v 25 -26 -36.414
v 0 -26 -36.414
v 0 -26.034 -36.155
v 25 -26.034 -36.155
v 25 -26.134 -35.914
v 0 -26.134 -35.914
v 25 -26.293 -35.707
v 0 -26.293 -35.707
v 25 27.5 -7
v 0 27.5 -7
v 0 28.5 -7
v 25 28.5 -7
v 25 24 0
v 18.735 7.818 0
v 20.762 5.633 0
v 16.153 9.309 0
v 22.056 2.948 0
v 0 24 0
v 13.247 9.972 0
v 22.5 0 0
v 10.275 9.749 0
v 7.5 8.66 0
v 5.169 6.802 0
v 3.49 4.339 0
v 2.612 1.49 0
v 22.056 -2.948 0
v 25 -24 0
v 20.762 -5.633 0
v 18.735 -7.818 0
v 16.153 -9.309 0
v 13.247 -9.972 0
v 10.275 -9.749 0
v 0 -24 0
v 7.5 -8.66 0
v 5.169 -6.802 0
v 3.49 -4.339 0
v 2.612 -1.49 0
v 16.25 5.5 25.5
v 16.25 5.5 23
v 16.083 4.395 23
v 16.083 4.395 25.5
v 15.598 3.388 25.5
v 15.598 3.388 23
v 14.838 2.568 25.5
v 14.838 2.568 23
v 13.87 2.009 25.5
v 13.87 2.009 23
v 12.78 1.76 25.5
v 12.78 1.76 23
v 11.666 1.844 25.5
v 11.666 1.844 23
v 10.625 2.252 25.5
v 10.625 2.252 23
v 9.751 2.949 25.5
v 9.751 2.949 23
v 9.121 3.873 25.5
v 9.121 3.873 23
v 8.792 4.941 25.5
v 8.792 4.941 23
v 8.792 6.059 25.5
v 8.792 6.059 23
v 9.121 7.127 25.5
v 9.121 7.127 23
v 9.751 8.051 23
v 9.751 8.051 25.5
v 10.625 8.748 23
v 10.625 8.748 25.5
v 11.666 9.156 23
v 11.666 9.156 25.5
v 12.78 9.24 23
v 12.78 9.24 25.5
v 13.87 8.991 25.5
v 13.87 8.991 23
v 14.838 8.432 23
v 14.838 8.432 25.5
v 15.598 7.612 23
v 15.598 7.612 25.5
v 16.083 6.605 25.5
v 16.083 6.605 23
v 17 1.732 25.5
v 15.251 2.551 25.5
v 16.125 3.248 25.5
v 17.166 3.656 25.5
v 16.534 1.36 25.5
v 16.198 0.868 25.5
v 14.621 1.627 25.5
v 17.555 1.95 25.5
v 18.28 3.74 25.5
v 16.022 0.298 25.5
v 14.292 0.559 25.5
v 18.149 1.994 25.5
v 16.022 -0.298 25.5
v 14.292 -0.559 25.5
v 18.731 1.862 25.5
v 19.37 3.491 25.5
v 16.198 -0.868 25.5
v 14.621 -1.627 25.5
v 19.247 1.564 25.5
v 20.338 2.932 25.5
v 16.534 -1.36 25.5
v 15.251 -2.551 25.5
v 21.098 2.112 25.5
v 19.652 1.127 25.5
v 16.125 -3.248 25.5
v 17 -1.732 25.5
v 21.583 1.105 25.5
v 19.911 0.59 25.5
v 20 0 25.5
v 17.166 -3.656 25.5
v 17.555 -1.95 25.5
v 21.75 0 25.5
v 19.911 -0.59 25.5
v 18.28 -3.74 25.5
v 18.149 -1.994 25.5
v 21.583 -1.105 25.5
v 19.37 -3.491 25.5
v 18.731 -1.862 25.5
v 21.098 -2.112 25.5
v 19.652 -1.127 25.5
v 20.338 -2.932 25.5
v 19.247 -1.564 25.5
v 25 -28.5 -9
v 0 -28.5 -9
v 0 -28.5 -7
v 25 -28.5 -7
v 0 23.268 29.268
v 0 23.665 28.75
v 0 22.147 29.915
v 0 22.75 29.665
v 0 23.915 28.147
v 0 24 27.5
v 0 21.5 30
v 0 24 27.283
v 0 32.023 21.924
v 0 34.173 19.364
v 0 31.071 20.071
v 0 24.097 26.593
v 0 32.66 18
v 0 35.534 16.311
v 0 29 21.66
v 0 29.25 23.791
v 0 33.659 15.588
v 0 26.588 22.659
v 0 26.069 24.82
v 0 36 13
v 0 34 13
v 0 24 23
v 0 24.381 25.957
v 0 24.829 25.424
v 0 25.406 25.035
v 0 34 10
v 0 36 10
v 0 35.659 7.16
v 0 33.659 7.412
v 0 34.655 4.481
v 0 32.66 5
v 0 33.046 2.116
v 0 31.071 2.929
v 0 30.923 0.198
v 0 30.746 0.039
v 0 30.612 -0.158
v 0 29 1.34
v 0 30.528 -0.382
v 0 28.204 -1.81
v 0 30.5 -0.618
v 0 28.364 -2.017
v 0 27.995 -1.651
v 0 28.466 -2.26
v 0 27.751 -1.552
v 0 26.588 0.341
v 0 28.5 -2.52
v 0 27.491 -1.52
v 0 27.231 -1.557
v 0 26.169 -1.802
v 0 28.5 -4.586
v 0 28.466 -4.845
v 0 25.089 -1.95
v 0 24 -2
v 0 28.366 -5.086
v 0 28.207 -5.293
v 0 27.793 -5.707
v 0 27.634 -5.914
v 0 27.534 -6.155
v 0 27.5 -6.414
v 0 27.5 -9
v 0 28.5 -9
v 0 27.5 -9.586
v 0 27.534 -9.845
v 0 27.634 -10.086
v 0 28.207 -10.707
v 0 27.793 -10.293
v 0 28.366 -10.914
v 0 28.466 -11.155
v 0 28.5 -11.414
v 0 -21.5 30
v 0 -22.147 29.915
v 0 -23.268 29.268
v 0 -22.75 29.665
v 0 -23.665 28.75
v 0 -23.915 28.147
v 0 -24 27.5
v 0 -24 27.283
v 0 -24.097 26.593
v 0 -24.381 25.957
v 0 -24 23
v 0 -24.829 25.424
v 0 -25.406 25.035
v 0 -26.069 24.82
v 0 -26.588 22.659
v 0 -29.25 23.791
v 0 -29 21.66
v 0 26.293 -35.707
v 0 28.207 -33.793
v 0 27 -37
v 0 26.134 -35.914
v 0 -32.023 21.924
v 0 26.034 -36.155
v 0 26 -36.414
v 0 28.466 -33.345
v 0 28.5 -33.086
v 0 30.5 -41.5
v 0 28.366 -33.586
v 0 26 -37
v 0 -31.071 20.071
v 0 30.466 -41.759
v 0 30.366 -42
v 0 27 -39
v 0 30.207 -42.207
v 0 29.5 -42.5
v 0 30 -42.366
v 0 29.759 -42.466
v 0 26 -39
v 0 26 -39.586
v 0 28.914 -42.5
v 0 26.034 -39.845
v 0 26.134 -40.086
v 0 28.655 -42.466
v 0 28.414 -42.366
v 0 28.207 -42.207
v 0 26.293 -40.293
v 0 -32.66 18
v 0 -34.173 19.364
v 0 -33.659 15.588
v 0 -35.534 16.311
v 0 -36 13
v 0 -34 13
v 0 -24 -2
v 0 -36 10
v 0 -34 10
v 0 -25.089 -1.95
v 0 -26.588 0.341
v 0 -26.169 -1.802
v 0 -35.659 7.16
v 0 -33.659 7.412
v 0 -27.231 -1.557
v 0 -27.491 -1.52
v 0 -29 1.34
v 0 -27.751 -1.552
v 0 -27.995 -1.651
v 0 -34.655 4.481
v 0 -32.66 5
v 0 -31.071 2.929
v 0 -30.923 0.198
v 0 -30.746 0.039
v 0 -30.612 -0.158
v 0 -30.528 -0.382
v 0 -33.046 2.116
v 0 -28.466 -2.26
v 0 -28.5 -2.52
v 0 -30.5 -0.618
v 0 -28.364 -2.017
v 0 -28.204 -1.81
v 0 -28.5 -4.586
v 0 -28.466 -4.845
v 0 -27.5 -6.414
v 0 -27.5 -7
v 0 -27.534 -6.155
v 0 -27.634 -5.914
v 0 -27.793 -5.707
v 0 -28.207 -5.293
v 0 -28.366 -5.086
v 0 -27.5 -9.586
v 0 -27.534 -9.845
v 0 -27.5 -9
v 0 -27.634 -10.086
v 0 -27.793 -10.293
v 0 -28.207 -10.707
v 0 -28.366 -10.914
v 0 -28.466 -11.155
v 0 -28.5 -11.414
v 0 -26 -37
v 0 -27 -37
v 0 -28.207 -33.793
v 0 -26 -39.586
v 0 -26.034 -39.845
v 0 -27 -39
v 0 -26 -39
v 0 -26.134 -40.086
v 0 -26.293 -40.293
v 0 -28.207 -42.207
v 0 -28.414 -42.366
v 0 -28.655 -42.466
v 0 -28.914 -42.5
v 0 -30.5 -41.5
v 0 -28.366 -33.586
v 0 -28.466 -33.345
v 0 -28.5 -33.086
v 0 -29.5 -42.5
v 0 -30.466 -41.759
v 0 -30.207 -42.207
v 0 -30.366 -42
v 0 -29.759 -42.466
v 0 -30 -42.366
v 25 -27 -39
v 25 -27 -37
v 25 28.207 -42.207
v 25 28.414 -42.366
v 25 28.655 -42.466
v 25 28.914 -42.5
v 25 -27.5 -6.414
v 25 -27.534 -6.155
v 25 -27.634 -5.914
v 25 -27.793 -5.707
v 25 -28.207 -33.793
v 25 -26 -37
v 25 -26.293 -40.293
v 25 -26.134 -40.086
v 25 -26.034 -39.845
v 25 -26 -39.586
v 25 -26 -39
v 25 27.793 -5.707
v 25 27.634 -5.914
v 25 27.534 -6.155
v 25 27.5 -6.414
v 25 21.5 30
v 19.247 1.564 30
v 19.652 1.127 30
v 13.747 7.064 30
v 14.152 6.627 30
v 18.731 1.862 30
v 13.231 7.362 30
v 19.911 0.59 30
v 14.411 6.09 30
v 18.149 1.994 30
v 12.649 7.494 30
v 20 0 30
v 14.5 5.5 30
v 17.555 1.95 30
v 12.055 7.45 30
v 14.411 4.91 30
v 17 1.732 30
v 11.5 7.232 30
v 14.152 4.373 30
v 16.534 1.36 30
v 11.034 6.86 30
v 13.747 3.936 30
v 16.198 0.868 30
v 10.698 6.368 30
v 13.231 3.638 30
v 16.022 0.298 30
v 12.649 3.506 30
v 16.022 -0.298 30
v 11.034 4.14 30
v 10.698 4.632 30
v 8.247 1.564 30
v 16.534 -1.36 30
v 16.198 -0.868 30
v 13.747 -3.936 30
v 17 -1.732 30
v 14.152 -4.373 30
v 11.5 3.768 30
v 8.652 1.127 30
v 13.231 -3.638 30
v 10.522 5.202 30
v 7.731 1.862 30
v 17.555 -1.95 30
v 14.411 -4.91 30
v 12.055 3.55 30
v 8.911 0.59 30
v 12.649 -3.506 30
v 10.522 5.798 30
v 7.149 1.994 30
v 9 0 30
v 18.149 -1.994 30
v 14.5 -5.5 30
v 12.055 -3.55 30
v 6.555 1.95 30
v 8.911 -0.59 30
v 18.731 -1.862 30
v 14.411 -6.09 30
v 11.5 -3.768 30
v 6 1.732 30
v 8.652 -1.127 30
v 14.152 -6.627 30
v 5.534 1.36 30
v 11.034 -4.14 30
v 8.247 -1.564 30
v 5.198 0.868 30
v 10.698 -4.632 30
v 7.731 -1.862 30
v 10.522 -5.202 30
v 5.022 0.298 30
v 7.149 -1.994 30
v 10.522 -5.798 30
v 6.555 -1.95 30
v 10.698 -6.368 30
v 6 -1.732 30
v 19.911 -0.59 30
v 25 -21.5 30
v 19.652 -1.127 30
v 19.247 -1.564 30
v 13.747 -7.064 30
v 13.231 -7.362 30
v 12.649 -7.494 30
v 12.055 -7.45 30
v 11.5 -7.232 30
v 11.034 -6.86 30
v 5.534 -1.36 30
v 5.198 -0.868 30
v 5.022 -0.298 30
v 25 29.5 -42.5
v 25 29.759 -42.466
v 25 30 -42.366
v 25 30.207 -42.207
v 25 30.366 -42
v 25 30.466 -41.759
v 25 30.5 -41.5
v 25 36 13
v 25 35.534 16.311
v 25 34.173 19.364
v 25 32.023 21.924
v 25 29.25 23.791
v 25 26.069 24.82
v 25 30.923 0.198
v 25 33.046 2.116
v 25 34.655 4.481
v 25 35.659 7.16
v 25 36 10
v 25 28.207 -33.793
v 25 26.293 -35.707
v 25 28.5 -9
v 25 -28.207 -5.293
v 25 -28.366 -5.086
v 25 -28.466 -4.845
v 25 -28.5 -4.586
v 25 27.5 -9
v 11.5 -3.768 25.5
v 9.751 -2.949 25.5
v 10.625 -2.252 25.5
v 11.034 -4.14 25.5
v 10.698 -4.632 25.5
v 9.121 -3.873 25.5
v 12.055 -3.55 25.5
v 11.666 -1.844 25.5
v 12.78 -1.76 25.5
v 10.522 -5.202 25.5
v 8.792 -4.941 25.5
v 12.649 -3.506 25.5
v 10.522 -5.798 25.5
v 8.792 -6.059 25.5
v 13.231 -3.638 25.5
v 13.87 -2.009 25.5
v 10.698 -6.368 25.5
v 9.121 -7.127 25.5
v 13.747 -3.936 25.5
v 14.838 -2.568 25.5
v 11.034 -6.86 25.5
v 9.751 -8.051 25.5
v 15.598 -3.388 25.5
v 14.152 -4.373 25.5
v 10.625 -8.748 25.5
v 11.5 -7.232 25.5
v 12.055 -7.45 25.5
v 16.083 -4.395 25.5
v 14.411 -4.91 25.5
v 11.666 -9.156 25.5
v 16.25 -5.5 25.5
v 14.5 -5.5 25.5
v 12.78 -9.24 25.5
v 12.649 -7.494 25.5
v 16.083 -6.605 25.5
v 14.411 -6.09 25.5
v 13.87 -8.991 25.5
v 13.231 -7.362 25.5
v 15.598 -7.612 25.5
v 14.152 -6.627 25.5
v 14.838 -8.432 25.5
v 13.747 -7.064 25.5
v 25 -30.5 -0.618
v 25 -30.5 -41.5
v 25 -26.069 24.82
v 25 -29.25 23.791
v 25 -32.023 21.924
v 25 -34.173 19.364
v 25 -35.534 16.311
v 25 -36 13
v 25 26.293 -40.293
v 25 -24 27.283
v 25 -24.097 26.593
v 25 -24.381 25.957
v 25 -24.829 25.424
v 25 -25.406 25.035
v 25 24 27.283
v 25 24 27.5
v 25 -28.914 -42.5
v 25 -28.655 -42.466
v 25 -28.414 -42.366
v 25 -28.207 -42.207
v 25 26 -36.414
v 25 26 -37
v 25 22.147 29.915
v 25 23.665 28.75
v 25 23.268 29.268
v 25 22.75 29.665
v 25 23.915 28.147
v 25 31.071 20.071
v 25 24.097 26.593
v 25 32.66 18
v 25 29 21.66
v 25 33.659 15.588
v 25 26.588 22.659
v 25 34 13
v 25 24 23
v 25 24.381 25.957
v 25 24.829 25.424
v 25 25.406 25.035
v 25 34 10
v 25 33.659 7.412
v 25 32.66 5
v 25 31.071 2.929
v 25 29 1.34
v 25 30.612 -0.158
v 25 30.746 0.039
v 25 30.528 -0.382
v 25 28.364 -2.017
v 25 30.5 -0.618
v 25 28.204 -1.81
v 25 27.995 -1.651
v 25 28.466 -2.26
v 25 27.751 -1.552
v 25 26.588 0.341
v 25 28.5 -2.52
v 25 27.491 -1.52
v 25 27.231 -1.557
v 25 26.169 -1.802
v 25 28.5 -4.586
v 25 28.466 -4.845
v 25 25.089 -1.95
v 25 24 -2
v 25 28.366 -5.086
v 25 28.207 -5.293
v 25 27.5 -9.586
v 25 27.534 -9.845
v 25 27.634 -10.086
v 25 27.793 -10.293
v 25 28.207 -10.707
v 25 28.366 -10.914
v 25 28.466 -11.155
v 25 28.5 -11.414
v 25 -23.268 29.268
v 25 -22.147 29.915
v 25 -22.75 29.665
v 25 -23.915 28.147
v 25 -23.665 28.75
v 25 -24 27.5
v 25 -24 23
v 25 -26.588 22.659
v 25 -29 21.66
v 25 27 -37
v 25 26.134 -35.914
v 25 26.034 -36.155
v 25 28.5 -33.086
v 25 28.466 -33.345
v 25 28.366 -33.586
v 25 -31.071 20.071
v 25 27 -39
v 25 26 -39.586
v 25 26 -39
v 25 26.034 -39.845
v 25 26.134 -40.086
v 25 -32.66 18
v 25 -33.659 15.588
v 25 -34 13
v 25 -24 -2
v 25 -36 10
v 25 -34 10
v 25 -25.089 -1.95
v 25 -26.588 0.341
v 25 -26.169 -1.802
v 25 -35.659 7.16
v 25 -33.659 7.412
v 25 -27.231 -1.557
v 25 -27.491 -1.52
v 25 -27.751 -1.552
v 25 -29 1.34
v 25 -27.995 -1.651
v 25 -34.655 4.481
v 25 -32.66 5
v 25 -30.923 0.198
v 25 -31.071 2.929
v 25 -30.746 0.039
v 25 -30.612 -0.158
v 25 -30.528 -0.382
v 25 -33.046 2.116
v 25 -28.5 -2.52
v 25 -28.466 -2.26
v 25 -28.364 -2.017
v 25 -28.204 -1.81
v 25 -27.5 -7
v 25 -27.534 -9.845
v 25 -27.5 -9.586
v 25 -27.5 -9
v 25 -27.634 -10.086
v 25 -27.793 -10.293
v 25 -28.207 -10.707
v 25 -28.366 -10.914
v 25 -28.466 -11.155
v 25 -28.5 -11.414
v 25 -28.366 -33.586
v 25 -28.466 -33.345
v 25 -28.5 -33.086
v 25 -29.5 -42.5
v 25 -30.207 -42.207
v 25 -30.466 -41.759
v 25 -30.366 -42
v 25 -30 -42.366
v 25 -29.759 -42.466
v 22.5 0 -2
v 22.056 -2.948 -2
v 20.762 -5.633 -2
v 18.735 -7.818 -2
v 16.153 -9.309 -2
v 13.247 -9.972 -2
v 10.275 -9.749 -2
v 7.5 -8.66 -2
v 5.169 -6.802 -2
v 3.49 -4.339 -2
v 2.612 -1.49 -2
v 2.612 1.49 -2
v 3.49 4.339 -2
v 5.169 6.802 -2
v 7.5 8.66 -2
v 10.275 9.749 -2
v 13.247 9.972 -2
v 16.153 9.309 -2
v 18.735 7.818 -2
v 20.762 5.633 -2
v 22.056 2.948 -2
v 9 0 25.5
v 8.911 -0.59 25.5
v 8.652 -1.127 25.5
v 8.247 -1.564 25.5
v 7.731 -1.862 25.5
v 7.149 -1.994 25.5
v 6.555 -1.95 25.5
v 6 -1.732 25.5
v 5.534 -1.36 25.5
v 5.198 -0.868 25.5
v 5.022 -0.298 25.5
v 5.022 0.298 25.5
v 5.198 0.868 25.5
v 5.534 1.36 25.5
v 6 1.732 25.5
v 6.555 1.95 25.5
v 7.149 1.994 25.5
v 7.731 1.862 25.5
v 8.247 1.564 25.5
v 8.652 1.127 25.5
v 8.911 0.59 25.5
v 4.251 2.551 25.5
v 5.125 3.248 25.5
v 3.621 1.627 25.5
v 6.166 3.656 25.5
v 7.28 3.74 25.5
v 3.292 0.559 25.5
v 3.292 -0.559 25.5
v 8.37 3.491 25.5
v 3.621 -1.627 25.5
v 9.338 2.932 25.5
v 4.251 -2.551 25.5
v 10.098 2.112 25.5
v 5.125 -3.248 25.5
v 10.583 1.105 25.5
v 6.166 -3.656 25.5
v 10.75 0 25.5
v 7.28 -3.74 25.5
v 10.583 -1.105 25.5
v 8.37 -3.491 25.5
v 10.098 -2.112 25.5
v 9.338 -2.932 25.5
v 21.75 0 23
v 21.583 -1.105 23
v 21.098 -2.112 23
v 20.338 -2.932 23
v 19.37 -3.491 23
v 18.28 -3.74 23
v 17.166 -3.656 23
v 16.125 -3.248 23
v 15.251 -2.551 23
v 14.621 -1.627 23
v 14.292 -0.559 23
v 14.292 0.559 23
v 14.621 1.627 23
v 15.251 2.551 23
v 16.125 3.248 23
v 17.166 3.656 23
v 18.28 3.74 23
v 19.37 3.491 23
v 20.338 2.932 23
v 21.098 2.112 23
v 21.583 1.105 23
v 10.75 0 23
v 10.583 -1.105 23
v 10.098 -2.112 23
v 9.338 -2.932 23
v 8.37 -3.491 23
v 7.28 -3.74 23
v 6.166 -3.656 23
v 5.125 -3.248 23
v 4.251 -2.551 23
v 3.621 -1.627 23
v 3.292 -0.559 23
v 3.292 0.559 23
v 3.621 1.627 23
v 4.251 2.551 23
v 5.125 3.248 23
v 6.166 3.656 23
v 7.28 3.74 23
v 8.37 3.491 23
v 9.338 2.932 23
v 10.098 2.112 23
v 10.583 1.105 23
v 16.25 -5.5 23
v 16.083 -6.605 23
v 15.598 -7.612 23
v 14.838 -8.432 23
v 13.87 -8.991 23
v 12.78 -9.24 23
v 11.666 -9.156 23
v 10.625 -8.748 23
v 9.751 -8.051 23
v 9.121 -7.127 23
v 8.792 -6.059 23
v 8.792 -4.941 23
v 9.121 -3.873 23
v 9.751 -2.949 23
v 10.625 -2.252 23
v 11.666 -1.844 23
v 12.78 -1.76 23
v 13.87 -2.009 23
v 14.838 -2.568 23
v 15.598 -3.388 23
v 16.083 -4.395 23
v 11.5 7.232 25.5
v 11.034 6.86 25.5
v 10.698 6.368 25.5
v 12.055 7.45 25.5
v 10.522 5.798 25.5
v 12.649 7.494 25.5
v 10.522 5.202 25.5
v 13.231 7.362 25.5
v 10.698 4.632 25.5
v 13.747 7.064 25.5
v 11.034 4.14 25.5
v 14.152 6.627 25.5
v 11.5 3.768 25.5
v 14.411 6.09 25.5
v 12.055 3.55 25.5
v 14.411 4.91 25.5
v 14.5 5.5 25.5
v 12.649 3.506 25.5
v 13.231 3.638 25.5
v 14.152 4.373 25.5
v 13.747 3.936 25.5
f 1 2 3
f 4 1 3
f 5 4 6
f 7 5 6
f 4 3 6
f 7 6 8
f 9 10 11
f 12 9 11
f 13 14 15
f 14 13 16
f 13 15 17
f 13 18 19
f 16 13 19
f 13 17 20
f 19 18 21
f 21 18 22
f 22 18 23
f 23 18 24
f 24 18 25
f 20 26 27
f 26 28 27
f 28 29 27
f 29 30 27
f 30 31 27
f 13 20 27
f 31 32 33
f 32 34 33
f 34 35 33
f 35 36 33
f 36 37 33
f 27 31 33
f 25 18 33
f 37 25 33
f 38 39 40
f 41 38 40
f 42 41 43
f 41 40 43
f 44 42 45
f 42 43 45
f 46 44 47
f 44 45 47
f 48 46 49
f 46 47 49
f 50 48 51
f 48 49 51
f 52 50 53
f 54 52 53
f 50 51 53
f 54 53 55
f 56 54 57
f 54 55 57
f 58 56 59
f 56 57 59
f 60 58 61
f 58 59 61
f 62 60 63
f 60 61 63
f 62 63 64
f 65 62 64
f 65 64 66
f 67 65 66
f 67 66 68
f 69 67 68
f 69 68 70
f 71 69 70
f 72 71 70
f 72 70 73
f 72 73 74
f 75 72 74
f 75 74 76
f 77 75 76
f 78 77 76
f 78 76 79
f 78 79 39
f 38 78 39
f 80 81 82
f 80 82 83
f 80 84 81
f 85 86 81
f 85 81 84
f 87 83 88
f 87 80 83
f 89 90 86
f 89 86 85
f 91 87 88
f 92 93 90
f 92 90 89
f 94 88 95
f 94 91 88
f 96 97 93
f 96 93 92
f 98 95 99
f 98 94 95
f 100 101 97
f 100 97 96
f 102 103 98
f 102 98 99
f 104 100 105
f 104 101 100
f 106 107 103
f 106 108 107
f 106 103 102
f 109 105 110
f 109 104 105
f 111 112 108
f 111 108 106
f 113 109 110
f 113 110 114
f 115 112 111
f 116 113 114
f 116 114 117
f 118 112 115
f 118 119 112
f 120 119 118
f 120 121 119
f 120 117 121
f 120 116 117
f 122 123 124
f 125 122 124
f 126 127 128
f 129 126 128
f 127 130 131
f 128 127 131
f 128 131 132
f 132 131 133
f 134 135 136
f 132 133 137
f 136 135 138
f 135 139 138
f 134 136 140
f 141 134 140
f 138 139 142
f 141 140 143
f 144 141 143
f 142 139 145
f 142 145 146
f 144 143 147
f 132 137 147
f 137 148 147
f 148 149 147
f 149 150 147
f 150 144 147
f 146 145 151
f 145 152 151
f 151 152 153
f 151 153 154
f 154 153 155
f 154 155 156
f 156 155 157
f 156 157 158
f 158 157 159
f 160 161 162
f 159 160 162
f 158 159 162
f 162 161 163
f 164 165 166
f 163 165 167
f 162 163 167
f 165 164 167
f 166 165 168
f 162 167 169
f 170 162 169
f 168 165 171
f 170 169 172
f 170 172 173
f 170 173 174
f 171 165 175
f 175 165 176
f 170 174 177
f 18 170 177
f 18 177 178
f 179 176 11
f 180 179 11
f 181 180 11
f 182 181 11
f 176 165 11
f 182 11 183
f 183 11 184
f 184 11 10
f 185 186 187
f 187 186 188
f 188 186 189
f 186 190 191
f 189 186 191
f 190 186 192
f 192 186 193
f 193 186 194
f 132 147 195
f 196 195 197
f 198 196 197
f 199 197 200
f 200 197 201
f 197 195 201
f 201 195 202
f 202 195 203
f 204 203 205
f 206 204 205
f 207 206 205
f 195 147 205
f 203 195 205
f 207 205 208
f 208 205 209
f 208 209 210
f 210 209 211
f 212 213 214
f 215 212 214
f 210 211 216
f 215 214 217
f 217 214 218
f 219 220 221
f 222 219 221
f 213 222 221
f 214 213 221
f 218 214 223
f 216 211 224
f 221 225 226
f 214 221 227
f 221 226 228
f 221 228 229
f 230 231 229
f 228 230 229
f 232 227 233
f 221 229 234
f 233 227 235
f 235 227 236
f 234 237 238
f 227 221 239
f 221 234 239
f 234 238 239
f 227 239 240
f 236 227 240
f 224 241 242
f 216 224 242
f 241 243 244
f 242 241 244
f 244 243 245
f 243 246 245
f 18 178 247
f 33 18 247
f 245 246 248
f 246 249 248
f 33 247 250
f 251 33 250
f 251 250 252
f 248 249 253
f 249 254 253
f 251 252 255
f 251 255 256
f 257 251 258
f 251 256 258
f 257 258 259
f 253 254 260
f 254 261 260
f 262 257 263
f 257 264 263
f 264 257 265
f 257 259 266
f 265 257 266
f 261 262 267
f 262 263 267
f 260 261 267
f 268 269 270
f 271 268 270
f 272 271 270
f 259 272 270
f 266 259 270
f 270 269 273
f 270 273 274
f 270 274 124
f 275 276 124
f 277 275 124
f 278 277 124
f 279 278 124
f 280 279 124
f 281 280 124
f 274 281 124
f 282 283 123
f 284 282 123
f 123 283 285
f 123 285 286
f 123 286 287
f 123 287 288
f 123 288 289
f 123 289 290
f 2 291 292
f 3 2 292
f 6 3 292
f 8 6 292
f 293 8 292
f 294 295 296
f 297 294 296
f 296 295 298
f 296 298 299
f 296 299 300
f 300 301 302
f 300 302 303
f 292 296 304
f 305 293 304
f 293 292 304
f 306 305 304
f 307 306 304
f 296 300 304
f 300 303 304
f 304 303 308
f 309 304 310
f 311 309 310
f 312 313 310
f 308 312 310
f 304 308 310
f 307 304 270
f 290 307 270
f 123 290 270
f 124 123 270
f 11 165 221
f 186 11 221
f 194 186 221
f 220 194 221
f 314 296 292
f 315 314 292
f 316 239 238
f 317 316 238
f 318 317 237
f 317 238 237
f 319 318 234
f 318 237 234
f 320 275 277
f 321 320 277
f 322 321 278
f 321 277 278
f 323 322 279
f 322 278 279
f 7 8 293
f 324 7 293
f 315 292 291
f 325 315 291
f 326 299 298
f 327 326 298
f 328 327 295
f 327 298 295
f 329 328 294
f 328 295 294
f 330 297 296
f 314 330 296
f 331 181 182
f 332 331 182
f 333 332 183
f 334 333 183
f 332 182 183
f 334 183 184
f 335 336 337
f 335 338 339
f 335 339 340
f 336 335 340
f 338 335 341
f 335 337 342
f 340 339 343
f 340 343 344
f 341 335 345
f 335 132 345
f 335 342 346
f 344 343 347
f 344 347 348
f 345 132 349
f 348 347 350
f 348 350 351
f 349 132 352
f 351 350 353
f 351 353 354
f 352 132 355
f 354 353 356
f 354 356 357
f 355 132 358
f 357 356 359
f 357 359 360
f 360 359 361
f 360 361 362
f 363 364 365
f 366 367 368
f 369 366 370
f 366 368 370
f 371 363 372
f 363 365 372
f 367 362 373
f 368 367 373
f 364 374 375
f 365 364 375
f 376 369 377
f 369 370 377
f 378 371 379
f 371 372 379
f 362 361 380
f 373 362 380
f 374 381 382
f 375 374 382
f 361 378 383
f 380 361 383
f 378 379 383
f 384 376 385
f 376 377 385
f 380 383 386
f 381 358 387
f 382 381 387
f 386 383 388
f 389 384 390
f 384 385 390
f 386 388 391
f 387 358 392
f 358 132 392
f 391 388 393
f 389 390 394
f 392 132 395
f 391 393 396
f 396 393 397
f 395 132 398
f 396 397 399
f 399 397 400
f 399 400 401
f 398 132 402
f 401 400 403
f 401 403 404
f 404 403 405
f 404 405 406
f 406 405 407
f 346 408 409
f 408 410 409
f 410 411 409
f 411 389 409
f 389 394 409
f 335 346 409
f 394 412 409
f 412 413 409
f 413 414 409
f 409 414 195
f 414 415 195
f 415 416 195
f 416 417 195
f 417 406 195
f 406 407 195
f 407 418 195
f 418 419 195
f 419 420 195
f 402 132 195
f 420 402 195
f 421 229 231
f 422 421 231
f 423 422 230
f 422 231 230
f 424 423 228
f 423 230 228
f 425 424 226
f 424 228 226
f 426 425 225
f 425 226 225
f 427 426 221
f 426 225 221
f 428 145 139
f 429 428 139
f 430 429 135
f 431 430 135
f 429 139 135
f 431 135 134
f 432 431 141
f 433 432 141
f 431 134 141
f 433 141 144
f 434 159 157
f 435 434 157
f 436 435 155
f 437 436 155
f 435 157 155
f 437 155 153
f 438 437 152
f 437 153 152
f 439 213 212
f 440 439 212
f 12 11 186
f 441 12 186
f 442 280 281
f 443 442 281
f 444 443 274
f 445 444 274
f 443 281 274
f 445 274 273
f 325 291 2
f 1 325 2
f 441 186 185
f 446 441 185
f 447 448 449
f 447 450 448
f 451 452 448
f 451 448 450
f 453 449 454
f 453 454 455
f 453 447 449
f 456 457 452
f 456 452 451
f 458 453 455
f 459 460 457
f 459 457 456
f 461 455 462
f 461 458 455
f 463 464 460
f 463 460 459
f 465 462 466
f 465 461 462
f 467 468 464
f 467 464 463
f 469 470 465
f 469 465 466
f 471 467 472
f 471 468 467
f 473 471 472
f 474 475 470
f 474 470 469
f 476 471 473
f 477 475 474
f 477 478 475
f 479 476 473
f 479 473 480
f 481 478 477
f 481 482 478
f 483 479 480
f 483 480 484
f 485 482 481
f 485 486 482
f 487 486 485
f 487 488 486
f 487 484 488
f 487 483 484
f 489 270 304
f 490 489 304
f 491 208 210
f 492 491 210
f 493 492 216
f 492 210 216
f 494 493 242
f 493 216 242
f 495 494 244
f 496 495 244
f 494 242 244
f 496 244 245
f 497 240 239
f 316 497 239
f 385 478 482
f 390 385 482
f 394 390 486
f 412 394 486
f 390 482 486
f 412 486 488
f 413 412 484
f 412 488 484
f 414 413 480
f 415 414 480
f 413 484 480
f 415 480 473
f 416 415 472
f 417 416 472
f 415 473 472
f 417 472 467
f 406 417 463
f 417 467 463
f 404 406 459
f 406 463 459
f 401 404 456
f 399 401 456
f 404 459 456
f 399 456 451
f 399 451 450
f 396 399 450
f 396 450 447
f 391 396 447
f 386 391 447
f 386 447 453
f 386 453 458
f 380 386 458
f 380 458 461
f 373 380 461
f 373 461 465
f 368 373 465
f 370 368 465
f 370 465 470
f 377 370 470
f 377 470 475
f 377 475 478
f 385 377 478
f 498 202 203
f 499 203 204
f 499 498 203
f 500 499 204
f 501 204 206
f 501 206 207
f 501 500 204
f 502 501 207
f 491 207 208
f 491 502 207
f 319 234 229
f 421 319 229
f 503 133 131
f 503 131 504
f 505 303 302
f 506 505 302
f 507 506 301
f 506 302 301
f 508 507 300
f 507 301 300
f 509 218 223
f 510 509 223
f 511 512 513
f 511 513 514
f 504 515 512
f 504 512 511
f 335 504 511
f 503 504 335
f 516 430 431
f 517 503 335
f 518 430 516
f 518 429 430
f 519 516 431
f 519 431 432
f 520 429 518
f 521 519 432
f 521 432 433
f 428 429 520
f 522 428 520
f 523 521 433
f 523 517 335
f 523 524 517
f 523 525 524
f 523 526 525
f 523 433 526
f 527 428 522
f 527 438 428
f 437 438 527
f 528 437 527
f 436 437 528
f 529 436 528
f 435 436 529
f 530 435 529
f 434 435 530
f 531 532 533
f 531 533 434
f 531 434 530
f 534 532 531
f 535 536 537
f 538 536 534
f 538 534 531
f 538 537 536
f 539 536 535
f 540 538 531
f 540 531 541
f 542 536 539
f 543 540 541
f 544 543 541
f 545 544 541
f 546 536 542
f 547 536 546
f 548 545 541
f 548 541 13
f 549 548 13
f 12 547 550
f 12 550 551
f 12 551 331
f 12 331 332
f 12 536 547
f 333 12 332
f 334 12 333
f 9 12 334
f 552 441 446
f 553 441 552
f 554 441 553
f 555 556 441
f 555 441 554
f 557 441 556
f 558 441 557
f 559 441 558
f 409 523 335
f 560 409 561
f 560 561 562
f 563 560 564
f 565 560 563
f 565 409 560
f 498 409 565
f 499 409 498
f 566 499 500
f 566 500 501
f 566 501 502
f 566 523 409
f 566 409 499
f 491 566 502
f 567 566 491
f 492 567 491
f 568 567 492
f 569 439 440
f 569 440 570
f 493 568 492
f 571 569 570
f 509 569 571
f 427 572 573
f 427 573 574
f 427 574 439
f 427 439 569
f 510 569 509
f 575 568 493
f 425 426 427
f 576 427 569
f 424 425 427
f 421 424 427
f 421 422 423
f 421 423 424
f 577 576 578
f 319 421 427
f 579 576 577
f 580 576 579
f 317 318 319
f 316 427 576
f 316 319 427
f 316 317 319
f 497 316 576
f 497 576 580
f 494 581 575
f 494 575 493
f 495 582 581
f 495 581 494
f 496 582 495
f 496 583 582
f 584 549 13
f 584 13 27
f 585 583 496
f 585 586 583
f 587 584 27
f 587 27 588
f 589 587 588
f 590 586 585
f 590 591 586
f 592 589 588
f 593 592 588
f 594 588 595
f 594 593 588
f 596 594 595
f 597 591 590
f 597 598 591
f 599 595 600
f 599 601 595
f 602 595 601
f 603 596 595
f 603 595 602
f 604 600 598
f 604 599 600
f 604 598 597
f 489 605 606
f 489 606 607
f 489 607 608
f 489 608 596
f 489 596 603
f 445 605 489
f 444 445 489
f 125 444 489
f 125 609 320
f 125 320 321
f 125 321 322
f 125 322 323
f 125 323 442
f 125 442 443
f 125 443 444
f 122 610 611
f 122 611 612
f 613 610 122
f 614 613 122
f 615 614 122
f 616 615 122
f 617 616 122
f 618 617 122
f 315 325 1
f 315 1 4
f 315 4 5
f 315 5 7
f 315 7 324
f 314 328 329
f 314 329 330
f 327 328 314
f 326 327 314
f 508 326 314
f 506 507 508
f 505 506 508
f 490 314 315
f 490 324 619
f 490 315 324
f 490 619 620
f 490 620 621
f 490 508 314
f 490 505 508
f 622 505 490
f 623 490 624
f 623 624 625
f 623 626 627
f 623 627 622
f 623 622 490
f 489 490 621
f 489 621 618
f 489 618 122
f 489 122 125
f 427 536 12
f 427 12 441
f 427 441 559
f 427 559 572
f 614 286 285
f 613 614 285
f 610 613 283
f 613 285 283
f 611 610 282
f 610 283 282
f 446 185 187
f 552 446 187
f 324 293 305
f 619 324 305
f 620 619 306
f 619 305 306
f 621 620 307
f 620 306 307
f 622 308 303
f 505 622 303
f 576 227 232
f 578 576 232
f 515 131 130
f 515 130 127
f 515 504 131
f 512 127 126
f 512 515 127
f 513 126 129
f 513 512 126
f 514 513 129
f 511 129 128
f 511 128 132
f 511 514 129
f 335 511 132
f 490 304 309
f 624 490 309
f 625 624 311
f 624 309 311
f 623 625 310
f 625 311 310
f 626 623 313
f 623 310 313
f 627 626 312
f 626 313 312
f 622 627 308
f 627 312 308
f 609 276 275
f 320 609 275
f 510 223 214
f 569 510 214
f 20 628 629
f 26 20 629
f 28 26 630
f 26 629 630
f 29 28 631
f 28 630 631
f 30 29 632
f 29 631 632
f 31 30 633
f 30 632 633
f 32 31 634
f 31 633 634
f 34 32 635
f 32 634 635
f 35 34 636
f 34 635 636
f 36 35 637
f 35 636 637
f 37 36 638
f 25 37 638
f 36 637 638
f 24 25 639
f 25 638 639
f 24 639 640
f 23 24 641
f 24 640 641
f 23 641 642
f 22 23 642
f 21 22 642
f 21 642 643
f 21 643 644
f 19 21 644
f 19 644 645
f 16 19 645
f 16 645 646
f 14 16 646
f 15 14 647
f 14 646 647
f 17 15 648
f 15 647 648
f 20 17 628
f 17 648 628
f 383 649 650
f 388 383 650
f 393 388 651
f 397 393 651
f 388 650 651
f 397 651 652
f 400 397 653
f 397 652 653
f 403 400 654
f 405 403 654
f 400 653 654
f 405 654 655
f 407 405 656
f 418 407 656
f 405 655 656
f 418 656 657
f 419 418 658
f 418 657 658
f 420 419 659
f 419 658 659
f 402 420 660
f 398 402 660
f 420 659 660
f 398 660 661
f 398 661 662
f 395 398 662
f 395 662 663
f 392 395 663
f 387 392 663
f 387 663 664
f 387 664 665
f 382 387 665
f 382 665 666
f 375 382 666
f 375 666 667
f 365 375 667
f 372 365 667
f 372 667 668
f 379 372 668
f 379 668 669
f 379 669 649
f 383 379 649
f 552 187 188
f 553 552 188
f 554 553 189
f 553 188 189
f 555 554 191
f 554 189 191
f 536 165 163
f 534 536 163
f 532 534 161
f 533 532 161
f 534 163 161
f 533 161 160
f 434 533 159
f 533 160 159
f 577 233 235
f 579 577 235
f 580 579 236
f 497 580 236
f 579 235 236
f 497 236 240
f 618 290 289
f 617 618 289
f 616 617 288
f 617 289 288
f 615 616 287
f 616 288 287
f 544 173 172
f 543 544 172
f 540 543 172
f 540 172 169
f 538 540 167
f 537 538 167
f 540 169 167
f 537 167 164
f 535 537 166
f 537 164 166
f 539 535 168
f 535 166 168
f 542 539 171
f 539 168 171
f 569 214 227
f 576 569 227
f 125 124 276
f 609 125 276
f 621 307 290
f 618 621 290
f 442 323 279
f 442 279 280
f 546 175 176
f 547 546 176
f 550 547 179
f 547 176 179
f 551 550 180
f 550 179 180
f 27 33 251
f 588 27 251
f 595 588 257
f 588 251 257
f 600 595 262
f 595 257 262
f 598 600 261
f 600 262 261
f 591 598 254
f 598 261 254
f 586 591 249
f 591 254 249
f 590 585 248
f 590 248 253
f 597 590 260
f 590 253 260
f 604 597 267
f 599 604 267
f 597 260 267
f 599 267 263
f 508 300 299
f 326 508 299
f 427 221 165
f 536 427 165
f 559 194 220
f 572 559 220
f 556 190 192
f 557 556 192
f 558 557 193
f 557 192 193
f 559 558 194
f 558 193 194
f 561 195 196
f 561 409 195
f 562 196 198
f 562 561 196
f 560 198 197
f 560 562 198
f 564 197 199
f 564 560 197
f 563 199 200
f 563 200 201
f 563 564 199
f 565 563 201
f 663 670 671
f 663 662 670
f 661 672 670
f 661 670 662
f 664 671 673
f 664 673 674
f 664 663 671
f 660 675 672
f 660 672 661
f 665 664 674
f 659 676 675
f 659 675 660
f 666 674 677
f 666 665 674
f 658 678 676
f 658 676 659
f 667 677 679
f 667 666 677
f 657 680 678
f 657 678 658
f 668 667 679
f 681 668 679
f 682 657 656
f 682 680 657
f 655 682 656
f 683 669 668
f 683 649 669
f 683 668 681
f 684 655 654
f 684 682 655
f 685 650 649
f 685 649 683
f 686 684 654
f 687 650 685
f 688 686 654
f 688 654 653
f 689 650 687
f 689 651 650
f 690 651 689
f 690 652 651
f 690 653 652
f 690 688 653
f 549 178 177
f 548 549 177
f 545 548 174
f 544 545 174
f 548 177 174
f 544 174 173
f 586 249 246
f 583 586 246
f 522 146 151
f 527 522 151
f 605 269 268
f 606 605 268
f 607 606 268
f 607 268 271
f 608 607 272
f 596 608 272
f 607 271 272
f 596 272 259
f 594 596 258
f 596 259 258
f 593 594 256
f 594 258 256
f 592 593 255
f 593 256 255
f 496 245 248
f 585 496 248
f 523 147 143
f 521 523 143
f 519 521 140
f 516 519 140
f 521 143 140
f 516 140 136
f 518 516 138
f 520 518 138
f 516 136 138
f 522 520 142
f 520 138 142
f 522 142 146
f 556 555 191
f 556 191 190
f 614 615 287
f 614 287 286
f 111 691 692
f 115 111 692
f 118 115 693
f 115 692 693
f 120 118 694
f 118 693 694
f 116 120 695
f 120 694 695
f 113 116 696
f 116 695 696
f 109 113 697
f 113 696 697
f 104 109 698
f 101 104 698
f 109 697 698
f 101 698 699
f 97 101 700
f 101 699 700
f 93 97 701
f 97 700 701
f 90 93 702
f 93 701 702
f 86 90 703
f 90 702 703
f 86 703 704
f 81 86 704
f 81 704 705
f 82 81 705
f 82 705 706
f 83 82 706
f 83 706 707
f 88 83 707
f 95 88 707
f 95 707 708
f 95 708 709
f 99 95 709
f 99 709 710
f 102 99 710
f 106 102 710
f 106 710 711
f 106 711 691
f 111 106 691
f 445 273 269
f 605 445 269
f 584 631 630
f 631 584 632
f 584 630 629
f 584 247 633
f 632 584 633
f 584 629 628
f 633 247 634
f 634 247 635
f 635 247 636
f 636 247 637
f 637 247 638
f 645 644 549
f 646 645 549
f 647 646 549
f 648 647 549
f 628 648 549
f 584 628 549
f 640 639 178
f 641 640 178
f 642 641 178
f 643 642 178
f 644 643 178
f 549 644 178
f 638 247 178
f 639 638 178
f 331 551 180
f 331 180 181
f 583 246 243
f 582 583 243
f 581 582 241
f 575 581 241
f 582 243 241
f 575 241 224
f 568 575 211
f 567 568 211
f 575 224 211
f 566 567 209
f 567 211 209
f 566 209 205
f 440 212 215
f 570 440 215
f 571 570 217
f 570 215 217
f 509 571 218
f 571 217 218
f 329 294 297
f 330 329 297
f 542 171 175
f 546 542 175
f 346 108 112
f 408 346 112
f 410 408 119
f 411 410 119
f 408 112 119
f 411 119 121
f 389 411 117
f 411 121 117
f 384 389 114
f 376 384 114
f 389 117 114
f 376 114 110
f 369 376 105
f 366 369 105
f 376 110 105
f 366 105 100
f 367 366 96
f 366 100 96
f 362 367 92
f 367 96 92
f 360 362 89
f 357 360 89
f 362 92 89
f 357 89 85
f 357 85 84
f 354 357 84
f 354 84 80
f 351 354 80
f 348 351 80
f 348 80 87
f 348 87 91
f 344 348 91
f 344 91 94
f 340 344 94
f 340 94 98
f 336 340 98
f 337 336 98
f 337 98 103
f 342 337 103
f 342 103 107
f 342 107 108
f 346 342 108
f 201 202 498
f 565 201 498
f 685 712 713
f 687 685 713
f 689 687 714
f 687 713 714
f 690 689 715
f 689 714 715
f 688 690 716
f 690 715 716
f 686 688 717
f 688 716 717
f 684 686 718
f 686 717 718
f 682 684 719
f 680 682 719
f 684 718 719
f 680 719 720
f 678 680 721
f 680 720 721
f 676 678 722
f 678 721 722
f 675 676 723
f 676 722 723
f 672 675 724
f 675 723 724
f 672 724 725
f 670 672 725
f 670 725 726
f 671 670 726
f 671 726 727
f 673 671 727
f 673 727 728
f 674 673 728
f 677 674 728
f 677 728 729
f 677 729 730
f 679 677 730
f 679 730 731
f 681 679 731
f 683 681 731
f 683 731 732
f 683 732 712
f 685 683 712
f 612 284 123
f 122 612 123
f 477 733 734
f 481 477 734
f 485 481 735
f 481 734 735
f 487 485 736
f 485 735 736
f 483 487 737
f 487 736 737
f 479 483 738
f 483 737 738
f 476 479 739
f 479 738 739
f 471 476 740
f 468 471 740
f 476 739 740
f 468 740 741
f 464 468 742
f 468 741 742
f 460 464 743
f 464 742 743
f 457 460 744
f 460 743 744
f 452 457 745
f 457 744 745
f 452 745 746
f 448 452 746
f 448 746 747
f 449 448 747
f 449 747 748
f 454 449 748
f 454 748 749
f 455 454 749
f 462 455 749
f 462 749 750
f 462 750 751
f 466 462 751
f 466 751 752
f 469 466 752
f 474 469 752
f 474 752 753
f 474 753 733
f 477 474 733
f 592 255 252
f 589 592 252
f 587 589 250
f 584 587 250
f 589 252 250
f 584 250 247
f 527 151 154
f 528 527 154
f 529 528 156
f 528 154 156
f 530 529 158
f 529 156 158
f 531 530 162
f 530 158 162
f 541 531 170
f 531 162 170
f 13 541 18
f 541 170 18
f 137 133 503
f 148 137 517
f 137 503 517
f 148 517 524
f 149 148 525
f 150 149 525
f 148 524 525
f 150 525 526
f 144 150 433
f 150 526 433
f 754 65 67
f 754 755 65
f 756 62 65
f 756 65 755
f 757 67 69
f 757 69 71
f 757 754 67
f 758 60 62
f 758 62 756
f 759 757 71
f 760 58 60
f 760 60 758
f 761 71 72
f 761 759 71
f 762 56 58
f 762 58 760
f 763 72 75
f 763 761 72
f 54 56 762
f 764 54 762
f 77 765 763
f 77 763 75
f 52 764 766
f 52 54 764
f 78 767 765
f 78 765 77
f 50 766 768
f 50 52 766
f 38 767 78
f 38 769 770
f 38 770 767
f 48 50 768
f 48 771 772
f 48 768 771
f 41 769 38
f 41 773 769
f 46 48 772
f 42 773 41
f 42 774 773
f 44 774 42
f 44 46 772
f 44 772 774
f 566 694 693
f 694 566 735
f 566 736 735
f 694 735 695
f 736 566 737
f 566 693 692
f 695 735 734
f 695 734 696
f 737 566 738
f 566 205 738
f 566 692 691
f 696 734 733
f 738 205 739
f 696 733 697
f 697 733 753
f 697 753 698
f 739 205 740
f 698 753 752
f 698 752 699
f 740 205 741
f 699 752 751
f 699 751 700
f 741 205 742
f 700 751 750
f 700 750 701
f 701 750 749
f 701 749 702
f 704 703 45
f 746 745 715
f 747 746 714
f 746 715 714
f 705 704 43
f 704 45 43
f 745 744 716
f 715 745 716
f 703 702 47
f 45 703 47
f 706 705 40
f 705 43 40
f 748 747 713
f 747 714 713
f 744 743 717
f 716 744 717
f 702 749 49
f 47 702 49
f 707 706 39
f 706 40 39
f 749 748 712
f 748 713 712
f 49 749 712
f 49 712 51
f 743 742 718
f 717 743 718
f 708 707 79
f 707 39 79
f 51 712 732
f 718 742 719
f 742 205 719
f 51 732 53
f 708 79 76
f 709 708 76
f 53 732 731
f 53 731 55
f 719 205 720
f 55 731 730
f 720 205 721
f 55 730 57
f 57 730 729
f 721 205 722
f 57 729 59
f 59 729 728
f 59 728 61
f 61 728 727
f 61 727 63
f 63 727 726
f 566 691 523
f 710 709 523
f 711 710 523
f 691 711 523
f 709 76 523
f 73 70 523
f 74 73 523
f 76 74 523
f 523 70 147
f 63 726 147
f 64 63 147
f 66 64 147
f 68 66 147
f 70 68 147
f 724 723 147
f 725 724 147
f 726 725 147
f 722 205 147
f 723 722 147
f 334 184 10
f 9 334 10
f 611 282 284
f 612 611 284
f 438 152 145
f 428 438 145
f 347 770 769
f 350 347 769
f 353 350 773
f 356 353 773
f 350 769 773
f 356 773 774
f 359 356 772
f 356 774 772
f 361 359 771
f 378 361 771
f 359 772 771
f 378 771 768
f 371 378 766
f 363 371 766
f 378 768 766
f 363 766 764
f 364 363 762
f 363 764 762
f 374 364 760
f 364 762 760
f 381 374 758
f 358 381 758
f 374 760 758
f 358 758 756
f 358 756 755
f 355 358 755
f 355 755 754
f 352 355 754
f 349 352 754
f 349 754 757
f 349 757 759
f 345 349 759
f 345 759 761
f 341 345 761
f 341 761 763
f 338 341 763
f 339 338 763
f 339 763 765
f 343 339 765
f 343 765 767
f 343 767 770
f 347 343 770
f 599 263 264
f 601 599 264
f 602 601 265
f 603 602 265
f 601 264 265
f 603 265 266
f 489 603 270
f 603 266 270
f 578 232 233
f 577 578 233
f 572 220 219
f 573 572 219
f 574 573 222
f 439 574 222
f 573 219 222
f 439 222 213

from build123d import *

# Parameters (mm, degrees)
F1_DEPTH       = 25
F3_DEPTH       = 5
F2_R           = 2
F4_DEPTH       = 7.001
F6_D           = 4
F6_CBORE_D     = 7.5
F6_CBORE_DEPTH = 2.5
F7_R           = 10
F8_DEPTH       = 2
F9_R           = 2.5


with BuildPart() as f1:
    # F0 (on Right) → F1 (new body)
    with BuildSketch(Plane.YZ):
        with BuildLine():
            Line((24, 25), (-24, 25))
            ThreePointArc((-24, 25), (-32.4852813742, 21.4852813742), (-36, 13))
            Line((-36, 13), (-36, 10))
            ThreePointArc((-36, 10), (-34.6554428129, 4.480802734), (-30.9230769231, 0.1984181931))
            ThreePointArc((-30.9230769231, 0.1984181931), (-30.6120464323, -0.1584471853), (-30.5, -0.6183802908))
            Line((-30.5, -0.6183802908), (-30.5, -41.5))
            ThreePointArc((-30.5, -41.5), (-30.2071067812, -42.2071067812), (-29.5, -42.5))
            Line((-29.5, -42.5), (-28.9142135624, -42.5))
            ThreePointArc((-28.9142135624, -42.5), (-28.53153013, -42.4238795325), (-28.2071067812, -42.2071067812))
            Line((-28.2071067812, -42.2071067812), (-26.2928932188, -40.2928932188))
            ThreePointArc((-26.2928932188, -40.2928932188), (-26.0761204675, -39.96846987), (-26, -39.5857864376))
            Line((-26, -39.5857864376), (-26, -39))
            Line((-26, -39), (-27, -39))
            Line((-27, -39), (-27, -37))
            Line((-27, -37), (-26, -37))
            Line((-26, -37), (-26, -36.4142135624))
            ThreePointArc((-26, -36.4142135624), (-26.0761204675, -36.03153013), (-26.2928932188, -35.7071067812))
            Line((-26.2928932188, -35.7071067812), (-28.2071067812, -33.7928932188))
            ThreePointArc((-28.2071067812, -33.7928932188), (-28.4238795325, -33.46846987), (-28.5, -33.0857864376))
            Line((-28.5, -33.0857864376), (-28.5, -11.4142135624))
            ThreePointArc((-28.5, -11.4142135624), (-28.4238795325, -11.03153013), (-28.2071067812, -10.7071067812))
            Line((-28.2071067812, -10.7071067812), (-27.7928932188, -10.2928932188))
            ThreePointArc((-27.7928932188, -10.2928932188), (-27.5761204675, -9.96846987), (-27.5, -9.5857864376))
            Line((-27.5, -9.5857864376), (-27.5, -9))
            Line((-27.5, -9), (-28.5, -9))
            Line((-28.5, -9), (-28.5, -7))
            Line((-28.5, -7), (-27.5, -7))
            Line((-27.5, -7), (-27.5, -6.4142135624))
            ThreePointArc((-27.5, -6.4142135624), (-27.5761204675, -6.03153013), (-27.7928932188, -5.7071067812))
            Line((-27.7928932188, -5.7071067812), (-28.2071067812, -5.2928932188))
            ThreePointArc((-28.2071067812, -5.2928932188), (-28.4238795325, -4.96846987), (-28.5, -4.5857864376))
            Line((-28.5, -4.5857864376), (-28.5, -2.5199840255))
            ThreePointArc((-28.5, -2.5199840255), (-28.1044705248, -1.7233565187), (-27.2307692308, -1.5569083313))
            ThreePointArc((-27.2307692308, -1.5569083313), (-25.6305060602, -1.8887110314), (-24, -2))
            Line((-24, -2), (24, -2))
            ThreePointArc((24, -2), (25.6305060602, -1.8887110314), (27.2307692308, -1.5569083313))
            ThreePointArc((27.2307692308, -1.5569083313), (28.1044705248, -1.7233565187), (28.5, -2.5199840255))
            Line((28.5, -2.5199840255), (28.5, -4.5857864376))
            ThreePointArc((28.5, -4.5857864376), (28.4238795325, -4.96846987), (28.2071067812, -5.2928932188))
            Line((28.2071067812, -5.2928932188), (27.7928932188, -5.7071067812))
            ThreePointArc((27.7928932188, -5.7071067812), (27.5761204675, -6.03153013), (27.5, -6.4142135624))
            Line((27.5, -6.4142135624), (27.5, -7))
            Line((27.5, -7), (28.5, -7))
            Line((28.5, -7), (28.5, -9))
            Line((28.5, -9), (27.5, -9))
            Line((27.5, -9), (27.5, -9.5857864376))
            ThreePointArc((27.5, -9.5857864376), (27.5761204675, -9.96846987), (27.7928932188, -10.2928932188))
            Line((27.7928932188, -10.2928932188), (28.2071067812, -10.7071067812))
            ThreePointArc((28.2071067812, -10.7071067812), (28.4238795325, -11.03153013), (28.5, -11.4142135624))
            Line((28.5, -11.4142135624), (28.5, -33.0857864376))
            ThreePointArc((28.5, -33.0857864376), (28.4238795325, -33.46846987), (28.2071067812, -33.7928932188))
            Line((28.2071067812, -33.7928932188), (26.2928932188, -35.7071067812))
            ThreePointArc((26.2928932188, -35.7071067812), (26.0761204675, -36.03153013), (26, -36.4142135624))
            Line((26, -36.4142135624), (26, -37))
            Line((26, -37), (27, -37))
            Line((27, -37), (27, -39))
            Line((27, -39), (26, -39))
            Line((26, -39), (26, -39.5857864376))
            ThreePointArc((26, -39.5857864376), (26.0761204675, -39.96846987), (26.2928932188, -40.2928932188))
            Line((26.2928932188, -40.2928932188), (28.2071067812, -42.2071067812))
            ThreePointArc((28.2071067812, -42.2071067812), (28.53153013, -42.4238795325), (28.9142135624, -42.5))
            Line((28.9142135624, -42.5), (29.5, -42.5))
            ThreePointArc((29.5, -42.5), (30.2071067812, -42.2071067812), (30.5, -41.5))
            Line((30.5, -41.5), (30.5, -0.6183802908))
            ThreePointArc((30.5, -0.6183802908), (30.6120464323, -0.1584471853), (30.9230769231, 0.1984181931))
            ThreePointArc((30.9230769231, 0.1984181931), (34.6554428129, 4.480802734), (36, 10))
            Line((36, 10), (36, 13))
            ThreePointArc((36, 13), (32.4852813742, 21.4852813742), (24, 25))
        make_face()
        with BuildLine():
            Line((24, 0), (-24, 0))
            ThreePointArc((-24, 0), (-31.0710678119, 2.9289321881), (-34, 10))
            Line((-34, 10), (-34, 13))
            ThreePointArc((-34, 13), (-31.0710678119, 20.0710678119), (-24, 23))
            Line((-24, 23), (24, 23))
            ThreePointArc((24, 23), (31.0710678119, 20.0710678119), (34, 13))
            Line((34, 13), (34, 10))
            ThreePointArc((34, 10), (31.0710678119, 2.9289321881), (24, 0))
        make_face(mode=Mode.SUBTRACT)
    extrude(amount=F1_DEPTH)

    # F3 (add): a face of the model
    f3_faces = [f1.faces().sort_by_distance(p)[0] for p in [
        (12.5, 0, 25),
    ]]
    extrude(f3_faces, amount=F3_DEPTH)

    # F2 (on face) → F4 (cut, through all)
    with BuildSketch(Plane(origin=(0, 0, 23), x_dir=(1, 0, 0), z_dir=(0, 0, -1))):
        with Locations((7, 0)):
            Circle(F2_R)
        with Locations((12.5, -5.5)):
            Circle(F2_R)
        with Locations((18, 0)):
            Circle(F2_R)
        with Locations((12.5, 5.5)):
            Circle(F2_R)
    extrude(amount=-F4_DEPTH, mode=Mode.SUBTRACT)

    # F6 (through all)
    with Locations(Plane(origin=(0, 0, 23), x_dir=(1, 0, 0), z_dir=(0, 0, -1))):
        with Locations((12.5, -5.5), (7, 0), (18, 0), (12.5, 5.5)):
            CounterBoreHole(F6_D / 2, F6_CBORE_D / 2, F6_CBORE_DEPTH)

    # F7 (on face) → F8 (cut, through all)
    with BuildSketch(Plane(origin=(0, 0, -2), x_dir=(1, 0, 0), z_dir=(0, 0, -1))):
        with Locations((12.5, 0)):
            Circle(F7_R)
    extrude(amount=-F8_DEPTH, mode=Mode.SUBTRACT)

    # F9
    f9_edges = [f1.edges().sort_by_distance(p)[0] for p in [
        (12.5, -24, 25),
        (12.5, 24, 25),
        (12.5, 24, 30),
        (12.5, -24, 30),
    ]]
    fillet(f9_edges, radius=F9_R)


solid = f1.part
